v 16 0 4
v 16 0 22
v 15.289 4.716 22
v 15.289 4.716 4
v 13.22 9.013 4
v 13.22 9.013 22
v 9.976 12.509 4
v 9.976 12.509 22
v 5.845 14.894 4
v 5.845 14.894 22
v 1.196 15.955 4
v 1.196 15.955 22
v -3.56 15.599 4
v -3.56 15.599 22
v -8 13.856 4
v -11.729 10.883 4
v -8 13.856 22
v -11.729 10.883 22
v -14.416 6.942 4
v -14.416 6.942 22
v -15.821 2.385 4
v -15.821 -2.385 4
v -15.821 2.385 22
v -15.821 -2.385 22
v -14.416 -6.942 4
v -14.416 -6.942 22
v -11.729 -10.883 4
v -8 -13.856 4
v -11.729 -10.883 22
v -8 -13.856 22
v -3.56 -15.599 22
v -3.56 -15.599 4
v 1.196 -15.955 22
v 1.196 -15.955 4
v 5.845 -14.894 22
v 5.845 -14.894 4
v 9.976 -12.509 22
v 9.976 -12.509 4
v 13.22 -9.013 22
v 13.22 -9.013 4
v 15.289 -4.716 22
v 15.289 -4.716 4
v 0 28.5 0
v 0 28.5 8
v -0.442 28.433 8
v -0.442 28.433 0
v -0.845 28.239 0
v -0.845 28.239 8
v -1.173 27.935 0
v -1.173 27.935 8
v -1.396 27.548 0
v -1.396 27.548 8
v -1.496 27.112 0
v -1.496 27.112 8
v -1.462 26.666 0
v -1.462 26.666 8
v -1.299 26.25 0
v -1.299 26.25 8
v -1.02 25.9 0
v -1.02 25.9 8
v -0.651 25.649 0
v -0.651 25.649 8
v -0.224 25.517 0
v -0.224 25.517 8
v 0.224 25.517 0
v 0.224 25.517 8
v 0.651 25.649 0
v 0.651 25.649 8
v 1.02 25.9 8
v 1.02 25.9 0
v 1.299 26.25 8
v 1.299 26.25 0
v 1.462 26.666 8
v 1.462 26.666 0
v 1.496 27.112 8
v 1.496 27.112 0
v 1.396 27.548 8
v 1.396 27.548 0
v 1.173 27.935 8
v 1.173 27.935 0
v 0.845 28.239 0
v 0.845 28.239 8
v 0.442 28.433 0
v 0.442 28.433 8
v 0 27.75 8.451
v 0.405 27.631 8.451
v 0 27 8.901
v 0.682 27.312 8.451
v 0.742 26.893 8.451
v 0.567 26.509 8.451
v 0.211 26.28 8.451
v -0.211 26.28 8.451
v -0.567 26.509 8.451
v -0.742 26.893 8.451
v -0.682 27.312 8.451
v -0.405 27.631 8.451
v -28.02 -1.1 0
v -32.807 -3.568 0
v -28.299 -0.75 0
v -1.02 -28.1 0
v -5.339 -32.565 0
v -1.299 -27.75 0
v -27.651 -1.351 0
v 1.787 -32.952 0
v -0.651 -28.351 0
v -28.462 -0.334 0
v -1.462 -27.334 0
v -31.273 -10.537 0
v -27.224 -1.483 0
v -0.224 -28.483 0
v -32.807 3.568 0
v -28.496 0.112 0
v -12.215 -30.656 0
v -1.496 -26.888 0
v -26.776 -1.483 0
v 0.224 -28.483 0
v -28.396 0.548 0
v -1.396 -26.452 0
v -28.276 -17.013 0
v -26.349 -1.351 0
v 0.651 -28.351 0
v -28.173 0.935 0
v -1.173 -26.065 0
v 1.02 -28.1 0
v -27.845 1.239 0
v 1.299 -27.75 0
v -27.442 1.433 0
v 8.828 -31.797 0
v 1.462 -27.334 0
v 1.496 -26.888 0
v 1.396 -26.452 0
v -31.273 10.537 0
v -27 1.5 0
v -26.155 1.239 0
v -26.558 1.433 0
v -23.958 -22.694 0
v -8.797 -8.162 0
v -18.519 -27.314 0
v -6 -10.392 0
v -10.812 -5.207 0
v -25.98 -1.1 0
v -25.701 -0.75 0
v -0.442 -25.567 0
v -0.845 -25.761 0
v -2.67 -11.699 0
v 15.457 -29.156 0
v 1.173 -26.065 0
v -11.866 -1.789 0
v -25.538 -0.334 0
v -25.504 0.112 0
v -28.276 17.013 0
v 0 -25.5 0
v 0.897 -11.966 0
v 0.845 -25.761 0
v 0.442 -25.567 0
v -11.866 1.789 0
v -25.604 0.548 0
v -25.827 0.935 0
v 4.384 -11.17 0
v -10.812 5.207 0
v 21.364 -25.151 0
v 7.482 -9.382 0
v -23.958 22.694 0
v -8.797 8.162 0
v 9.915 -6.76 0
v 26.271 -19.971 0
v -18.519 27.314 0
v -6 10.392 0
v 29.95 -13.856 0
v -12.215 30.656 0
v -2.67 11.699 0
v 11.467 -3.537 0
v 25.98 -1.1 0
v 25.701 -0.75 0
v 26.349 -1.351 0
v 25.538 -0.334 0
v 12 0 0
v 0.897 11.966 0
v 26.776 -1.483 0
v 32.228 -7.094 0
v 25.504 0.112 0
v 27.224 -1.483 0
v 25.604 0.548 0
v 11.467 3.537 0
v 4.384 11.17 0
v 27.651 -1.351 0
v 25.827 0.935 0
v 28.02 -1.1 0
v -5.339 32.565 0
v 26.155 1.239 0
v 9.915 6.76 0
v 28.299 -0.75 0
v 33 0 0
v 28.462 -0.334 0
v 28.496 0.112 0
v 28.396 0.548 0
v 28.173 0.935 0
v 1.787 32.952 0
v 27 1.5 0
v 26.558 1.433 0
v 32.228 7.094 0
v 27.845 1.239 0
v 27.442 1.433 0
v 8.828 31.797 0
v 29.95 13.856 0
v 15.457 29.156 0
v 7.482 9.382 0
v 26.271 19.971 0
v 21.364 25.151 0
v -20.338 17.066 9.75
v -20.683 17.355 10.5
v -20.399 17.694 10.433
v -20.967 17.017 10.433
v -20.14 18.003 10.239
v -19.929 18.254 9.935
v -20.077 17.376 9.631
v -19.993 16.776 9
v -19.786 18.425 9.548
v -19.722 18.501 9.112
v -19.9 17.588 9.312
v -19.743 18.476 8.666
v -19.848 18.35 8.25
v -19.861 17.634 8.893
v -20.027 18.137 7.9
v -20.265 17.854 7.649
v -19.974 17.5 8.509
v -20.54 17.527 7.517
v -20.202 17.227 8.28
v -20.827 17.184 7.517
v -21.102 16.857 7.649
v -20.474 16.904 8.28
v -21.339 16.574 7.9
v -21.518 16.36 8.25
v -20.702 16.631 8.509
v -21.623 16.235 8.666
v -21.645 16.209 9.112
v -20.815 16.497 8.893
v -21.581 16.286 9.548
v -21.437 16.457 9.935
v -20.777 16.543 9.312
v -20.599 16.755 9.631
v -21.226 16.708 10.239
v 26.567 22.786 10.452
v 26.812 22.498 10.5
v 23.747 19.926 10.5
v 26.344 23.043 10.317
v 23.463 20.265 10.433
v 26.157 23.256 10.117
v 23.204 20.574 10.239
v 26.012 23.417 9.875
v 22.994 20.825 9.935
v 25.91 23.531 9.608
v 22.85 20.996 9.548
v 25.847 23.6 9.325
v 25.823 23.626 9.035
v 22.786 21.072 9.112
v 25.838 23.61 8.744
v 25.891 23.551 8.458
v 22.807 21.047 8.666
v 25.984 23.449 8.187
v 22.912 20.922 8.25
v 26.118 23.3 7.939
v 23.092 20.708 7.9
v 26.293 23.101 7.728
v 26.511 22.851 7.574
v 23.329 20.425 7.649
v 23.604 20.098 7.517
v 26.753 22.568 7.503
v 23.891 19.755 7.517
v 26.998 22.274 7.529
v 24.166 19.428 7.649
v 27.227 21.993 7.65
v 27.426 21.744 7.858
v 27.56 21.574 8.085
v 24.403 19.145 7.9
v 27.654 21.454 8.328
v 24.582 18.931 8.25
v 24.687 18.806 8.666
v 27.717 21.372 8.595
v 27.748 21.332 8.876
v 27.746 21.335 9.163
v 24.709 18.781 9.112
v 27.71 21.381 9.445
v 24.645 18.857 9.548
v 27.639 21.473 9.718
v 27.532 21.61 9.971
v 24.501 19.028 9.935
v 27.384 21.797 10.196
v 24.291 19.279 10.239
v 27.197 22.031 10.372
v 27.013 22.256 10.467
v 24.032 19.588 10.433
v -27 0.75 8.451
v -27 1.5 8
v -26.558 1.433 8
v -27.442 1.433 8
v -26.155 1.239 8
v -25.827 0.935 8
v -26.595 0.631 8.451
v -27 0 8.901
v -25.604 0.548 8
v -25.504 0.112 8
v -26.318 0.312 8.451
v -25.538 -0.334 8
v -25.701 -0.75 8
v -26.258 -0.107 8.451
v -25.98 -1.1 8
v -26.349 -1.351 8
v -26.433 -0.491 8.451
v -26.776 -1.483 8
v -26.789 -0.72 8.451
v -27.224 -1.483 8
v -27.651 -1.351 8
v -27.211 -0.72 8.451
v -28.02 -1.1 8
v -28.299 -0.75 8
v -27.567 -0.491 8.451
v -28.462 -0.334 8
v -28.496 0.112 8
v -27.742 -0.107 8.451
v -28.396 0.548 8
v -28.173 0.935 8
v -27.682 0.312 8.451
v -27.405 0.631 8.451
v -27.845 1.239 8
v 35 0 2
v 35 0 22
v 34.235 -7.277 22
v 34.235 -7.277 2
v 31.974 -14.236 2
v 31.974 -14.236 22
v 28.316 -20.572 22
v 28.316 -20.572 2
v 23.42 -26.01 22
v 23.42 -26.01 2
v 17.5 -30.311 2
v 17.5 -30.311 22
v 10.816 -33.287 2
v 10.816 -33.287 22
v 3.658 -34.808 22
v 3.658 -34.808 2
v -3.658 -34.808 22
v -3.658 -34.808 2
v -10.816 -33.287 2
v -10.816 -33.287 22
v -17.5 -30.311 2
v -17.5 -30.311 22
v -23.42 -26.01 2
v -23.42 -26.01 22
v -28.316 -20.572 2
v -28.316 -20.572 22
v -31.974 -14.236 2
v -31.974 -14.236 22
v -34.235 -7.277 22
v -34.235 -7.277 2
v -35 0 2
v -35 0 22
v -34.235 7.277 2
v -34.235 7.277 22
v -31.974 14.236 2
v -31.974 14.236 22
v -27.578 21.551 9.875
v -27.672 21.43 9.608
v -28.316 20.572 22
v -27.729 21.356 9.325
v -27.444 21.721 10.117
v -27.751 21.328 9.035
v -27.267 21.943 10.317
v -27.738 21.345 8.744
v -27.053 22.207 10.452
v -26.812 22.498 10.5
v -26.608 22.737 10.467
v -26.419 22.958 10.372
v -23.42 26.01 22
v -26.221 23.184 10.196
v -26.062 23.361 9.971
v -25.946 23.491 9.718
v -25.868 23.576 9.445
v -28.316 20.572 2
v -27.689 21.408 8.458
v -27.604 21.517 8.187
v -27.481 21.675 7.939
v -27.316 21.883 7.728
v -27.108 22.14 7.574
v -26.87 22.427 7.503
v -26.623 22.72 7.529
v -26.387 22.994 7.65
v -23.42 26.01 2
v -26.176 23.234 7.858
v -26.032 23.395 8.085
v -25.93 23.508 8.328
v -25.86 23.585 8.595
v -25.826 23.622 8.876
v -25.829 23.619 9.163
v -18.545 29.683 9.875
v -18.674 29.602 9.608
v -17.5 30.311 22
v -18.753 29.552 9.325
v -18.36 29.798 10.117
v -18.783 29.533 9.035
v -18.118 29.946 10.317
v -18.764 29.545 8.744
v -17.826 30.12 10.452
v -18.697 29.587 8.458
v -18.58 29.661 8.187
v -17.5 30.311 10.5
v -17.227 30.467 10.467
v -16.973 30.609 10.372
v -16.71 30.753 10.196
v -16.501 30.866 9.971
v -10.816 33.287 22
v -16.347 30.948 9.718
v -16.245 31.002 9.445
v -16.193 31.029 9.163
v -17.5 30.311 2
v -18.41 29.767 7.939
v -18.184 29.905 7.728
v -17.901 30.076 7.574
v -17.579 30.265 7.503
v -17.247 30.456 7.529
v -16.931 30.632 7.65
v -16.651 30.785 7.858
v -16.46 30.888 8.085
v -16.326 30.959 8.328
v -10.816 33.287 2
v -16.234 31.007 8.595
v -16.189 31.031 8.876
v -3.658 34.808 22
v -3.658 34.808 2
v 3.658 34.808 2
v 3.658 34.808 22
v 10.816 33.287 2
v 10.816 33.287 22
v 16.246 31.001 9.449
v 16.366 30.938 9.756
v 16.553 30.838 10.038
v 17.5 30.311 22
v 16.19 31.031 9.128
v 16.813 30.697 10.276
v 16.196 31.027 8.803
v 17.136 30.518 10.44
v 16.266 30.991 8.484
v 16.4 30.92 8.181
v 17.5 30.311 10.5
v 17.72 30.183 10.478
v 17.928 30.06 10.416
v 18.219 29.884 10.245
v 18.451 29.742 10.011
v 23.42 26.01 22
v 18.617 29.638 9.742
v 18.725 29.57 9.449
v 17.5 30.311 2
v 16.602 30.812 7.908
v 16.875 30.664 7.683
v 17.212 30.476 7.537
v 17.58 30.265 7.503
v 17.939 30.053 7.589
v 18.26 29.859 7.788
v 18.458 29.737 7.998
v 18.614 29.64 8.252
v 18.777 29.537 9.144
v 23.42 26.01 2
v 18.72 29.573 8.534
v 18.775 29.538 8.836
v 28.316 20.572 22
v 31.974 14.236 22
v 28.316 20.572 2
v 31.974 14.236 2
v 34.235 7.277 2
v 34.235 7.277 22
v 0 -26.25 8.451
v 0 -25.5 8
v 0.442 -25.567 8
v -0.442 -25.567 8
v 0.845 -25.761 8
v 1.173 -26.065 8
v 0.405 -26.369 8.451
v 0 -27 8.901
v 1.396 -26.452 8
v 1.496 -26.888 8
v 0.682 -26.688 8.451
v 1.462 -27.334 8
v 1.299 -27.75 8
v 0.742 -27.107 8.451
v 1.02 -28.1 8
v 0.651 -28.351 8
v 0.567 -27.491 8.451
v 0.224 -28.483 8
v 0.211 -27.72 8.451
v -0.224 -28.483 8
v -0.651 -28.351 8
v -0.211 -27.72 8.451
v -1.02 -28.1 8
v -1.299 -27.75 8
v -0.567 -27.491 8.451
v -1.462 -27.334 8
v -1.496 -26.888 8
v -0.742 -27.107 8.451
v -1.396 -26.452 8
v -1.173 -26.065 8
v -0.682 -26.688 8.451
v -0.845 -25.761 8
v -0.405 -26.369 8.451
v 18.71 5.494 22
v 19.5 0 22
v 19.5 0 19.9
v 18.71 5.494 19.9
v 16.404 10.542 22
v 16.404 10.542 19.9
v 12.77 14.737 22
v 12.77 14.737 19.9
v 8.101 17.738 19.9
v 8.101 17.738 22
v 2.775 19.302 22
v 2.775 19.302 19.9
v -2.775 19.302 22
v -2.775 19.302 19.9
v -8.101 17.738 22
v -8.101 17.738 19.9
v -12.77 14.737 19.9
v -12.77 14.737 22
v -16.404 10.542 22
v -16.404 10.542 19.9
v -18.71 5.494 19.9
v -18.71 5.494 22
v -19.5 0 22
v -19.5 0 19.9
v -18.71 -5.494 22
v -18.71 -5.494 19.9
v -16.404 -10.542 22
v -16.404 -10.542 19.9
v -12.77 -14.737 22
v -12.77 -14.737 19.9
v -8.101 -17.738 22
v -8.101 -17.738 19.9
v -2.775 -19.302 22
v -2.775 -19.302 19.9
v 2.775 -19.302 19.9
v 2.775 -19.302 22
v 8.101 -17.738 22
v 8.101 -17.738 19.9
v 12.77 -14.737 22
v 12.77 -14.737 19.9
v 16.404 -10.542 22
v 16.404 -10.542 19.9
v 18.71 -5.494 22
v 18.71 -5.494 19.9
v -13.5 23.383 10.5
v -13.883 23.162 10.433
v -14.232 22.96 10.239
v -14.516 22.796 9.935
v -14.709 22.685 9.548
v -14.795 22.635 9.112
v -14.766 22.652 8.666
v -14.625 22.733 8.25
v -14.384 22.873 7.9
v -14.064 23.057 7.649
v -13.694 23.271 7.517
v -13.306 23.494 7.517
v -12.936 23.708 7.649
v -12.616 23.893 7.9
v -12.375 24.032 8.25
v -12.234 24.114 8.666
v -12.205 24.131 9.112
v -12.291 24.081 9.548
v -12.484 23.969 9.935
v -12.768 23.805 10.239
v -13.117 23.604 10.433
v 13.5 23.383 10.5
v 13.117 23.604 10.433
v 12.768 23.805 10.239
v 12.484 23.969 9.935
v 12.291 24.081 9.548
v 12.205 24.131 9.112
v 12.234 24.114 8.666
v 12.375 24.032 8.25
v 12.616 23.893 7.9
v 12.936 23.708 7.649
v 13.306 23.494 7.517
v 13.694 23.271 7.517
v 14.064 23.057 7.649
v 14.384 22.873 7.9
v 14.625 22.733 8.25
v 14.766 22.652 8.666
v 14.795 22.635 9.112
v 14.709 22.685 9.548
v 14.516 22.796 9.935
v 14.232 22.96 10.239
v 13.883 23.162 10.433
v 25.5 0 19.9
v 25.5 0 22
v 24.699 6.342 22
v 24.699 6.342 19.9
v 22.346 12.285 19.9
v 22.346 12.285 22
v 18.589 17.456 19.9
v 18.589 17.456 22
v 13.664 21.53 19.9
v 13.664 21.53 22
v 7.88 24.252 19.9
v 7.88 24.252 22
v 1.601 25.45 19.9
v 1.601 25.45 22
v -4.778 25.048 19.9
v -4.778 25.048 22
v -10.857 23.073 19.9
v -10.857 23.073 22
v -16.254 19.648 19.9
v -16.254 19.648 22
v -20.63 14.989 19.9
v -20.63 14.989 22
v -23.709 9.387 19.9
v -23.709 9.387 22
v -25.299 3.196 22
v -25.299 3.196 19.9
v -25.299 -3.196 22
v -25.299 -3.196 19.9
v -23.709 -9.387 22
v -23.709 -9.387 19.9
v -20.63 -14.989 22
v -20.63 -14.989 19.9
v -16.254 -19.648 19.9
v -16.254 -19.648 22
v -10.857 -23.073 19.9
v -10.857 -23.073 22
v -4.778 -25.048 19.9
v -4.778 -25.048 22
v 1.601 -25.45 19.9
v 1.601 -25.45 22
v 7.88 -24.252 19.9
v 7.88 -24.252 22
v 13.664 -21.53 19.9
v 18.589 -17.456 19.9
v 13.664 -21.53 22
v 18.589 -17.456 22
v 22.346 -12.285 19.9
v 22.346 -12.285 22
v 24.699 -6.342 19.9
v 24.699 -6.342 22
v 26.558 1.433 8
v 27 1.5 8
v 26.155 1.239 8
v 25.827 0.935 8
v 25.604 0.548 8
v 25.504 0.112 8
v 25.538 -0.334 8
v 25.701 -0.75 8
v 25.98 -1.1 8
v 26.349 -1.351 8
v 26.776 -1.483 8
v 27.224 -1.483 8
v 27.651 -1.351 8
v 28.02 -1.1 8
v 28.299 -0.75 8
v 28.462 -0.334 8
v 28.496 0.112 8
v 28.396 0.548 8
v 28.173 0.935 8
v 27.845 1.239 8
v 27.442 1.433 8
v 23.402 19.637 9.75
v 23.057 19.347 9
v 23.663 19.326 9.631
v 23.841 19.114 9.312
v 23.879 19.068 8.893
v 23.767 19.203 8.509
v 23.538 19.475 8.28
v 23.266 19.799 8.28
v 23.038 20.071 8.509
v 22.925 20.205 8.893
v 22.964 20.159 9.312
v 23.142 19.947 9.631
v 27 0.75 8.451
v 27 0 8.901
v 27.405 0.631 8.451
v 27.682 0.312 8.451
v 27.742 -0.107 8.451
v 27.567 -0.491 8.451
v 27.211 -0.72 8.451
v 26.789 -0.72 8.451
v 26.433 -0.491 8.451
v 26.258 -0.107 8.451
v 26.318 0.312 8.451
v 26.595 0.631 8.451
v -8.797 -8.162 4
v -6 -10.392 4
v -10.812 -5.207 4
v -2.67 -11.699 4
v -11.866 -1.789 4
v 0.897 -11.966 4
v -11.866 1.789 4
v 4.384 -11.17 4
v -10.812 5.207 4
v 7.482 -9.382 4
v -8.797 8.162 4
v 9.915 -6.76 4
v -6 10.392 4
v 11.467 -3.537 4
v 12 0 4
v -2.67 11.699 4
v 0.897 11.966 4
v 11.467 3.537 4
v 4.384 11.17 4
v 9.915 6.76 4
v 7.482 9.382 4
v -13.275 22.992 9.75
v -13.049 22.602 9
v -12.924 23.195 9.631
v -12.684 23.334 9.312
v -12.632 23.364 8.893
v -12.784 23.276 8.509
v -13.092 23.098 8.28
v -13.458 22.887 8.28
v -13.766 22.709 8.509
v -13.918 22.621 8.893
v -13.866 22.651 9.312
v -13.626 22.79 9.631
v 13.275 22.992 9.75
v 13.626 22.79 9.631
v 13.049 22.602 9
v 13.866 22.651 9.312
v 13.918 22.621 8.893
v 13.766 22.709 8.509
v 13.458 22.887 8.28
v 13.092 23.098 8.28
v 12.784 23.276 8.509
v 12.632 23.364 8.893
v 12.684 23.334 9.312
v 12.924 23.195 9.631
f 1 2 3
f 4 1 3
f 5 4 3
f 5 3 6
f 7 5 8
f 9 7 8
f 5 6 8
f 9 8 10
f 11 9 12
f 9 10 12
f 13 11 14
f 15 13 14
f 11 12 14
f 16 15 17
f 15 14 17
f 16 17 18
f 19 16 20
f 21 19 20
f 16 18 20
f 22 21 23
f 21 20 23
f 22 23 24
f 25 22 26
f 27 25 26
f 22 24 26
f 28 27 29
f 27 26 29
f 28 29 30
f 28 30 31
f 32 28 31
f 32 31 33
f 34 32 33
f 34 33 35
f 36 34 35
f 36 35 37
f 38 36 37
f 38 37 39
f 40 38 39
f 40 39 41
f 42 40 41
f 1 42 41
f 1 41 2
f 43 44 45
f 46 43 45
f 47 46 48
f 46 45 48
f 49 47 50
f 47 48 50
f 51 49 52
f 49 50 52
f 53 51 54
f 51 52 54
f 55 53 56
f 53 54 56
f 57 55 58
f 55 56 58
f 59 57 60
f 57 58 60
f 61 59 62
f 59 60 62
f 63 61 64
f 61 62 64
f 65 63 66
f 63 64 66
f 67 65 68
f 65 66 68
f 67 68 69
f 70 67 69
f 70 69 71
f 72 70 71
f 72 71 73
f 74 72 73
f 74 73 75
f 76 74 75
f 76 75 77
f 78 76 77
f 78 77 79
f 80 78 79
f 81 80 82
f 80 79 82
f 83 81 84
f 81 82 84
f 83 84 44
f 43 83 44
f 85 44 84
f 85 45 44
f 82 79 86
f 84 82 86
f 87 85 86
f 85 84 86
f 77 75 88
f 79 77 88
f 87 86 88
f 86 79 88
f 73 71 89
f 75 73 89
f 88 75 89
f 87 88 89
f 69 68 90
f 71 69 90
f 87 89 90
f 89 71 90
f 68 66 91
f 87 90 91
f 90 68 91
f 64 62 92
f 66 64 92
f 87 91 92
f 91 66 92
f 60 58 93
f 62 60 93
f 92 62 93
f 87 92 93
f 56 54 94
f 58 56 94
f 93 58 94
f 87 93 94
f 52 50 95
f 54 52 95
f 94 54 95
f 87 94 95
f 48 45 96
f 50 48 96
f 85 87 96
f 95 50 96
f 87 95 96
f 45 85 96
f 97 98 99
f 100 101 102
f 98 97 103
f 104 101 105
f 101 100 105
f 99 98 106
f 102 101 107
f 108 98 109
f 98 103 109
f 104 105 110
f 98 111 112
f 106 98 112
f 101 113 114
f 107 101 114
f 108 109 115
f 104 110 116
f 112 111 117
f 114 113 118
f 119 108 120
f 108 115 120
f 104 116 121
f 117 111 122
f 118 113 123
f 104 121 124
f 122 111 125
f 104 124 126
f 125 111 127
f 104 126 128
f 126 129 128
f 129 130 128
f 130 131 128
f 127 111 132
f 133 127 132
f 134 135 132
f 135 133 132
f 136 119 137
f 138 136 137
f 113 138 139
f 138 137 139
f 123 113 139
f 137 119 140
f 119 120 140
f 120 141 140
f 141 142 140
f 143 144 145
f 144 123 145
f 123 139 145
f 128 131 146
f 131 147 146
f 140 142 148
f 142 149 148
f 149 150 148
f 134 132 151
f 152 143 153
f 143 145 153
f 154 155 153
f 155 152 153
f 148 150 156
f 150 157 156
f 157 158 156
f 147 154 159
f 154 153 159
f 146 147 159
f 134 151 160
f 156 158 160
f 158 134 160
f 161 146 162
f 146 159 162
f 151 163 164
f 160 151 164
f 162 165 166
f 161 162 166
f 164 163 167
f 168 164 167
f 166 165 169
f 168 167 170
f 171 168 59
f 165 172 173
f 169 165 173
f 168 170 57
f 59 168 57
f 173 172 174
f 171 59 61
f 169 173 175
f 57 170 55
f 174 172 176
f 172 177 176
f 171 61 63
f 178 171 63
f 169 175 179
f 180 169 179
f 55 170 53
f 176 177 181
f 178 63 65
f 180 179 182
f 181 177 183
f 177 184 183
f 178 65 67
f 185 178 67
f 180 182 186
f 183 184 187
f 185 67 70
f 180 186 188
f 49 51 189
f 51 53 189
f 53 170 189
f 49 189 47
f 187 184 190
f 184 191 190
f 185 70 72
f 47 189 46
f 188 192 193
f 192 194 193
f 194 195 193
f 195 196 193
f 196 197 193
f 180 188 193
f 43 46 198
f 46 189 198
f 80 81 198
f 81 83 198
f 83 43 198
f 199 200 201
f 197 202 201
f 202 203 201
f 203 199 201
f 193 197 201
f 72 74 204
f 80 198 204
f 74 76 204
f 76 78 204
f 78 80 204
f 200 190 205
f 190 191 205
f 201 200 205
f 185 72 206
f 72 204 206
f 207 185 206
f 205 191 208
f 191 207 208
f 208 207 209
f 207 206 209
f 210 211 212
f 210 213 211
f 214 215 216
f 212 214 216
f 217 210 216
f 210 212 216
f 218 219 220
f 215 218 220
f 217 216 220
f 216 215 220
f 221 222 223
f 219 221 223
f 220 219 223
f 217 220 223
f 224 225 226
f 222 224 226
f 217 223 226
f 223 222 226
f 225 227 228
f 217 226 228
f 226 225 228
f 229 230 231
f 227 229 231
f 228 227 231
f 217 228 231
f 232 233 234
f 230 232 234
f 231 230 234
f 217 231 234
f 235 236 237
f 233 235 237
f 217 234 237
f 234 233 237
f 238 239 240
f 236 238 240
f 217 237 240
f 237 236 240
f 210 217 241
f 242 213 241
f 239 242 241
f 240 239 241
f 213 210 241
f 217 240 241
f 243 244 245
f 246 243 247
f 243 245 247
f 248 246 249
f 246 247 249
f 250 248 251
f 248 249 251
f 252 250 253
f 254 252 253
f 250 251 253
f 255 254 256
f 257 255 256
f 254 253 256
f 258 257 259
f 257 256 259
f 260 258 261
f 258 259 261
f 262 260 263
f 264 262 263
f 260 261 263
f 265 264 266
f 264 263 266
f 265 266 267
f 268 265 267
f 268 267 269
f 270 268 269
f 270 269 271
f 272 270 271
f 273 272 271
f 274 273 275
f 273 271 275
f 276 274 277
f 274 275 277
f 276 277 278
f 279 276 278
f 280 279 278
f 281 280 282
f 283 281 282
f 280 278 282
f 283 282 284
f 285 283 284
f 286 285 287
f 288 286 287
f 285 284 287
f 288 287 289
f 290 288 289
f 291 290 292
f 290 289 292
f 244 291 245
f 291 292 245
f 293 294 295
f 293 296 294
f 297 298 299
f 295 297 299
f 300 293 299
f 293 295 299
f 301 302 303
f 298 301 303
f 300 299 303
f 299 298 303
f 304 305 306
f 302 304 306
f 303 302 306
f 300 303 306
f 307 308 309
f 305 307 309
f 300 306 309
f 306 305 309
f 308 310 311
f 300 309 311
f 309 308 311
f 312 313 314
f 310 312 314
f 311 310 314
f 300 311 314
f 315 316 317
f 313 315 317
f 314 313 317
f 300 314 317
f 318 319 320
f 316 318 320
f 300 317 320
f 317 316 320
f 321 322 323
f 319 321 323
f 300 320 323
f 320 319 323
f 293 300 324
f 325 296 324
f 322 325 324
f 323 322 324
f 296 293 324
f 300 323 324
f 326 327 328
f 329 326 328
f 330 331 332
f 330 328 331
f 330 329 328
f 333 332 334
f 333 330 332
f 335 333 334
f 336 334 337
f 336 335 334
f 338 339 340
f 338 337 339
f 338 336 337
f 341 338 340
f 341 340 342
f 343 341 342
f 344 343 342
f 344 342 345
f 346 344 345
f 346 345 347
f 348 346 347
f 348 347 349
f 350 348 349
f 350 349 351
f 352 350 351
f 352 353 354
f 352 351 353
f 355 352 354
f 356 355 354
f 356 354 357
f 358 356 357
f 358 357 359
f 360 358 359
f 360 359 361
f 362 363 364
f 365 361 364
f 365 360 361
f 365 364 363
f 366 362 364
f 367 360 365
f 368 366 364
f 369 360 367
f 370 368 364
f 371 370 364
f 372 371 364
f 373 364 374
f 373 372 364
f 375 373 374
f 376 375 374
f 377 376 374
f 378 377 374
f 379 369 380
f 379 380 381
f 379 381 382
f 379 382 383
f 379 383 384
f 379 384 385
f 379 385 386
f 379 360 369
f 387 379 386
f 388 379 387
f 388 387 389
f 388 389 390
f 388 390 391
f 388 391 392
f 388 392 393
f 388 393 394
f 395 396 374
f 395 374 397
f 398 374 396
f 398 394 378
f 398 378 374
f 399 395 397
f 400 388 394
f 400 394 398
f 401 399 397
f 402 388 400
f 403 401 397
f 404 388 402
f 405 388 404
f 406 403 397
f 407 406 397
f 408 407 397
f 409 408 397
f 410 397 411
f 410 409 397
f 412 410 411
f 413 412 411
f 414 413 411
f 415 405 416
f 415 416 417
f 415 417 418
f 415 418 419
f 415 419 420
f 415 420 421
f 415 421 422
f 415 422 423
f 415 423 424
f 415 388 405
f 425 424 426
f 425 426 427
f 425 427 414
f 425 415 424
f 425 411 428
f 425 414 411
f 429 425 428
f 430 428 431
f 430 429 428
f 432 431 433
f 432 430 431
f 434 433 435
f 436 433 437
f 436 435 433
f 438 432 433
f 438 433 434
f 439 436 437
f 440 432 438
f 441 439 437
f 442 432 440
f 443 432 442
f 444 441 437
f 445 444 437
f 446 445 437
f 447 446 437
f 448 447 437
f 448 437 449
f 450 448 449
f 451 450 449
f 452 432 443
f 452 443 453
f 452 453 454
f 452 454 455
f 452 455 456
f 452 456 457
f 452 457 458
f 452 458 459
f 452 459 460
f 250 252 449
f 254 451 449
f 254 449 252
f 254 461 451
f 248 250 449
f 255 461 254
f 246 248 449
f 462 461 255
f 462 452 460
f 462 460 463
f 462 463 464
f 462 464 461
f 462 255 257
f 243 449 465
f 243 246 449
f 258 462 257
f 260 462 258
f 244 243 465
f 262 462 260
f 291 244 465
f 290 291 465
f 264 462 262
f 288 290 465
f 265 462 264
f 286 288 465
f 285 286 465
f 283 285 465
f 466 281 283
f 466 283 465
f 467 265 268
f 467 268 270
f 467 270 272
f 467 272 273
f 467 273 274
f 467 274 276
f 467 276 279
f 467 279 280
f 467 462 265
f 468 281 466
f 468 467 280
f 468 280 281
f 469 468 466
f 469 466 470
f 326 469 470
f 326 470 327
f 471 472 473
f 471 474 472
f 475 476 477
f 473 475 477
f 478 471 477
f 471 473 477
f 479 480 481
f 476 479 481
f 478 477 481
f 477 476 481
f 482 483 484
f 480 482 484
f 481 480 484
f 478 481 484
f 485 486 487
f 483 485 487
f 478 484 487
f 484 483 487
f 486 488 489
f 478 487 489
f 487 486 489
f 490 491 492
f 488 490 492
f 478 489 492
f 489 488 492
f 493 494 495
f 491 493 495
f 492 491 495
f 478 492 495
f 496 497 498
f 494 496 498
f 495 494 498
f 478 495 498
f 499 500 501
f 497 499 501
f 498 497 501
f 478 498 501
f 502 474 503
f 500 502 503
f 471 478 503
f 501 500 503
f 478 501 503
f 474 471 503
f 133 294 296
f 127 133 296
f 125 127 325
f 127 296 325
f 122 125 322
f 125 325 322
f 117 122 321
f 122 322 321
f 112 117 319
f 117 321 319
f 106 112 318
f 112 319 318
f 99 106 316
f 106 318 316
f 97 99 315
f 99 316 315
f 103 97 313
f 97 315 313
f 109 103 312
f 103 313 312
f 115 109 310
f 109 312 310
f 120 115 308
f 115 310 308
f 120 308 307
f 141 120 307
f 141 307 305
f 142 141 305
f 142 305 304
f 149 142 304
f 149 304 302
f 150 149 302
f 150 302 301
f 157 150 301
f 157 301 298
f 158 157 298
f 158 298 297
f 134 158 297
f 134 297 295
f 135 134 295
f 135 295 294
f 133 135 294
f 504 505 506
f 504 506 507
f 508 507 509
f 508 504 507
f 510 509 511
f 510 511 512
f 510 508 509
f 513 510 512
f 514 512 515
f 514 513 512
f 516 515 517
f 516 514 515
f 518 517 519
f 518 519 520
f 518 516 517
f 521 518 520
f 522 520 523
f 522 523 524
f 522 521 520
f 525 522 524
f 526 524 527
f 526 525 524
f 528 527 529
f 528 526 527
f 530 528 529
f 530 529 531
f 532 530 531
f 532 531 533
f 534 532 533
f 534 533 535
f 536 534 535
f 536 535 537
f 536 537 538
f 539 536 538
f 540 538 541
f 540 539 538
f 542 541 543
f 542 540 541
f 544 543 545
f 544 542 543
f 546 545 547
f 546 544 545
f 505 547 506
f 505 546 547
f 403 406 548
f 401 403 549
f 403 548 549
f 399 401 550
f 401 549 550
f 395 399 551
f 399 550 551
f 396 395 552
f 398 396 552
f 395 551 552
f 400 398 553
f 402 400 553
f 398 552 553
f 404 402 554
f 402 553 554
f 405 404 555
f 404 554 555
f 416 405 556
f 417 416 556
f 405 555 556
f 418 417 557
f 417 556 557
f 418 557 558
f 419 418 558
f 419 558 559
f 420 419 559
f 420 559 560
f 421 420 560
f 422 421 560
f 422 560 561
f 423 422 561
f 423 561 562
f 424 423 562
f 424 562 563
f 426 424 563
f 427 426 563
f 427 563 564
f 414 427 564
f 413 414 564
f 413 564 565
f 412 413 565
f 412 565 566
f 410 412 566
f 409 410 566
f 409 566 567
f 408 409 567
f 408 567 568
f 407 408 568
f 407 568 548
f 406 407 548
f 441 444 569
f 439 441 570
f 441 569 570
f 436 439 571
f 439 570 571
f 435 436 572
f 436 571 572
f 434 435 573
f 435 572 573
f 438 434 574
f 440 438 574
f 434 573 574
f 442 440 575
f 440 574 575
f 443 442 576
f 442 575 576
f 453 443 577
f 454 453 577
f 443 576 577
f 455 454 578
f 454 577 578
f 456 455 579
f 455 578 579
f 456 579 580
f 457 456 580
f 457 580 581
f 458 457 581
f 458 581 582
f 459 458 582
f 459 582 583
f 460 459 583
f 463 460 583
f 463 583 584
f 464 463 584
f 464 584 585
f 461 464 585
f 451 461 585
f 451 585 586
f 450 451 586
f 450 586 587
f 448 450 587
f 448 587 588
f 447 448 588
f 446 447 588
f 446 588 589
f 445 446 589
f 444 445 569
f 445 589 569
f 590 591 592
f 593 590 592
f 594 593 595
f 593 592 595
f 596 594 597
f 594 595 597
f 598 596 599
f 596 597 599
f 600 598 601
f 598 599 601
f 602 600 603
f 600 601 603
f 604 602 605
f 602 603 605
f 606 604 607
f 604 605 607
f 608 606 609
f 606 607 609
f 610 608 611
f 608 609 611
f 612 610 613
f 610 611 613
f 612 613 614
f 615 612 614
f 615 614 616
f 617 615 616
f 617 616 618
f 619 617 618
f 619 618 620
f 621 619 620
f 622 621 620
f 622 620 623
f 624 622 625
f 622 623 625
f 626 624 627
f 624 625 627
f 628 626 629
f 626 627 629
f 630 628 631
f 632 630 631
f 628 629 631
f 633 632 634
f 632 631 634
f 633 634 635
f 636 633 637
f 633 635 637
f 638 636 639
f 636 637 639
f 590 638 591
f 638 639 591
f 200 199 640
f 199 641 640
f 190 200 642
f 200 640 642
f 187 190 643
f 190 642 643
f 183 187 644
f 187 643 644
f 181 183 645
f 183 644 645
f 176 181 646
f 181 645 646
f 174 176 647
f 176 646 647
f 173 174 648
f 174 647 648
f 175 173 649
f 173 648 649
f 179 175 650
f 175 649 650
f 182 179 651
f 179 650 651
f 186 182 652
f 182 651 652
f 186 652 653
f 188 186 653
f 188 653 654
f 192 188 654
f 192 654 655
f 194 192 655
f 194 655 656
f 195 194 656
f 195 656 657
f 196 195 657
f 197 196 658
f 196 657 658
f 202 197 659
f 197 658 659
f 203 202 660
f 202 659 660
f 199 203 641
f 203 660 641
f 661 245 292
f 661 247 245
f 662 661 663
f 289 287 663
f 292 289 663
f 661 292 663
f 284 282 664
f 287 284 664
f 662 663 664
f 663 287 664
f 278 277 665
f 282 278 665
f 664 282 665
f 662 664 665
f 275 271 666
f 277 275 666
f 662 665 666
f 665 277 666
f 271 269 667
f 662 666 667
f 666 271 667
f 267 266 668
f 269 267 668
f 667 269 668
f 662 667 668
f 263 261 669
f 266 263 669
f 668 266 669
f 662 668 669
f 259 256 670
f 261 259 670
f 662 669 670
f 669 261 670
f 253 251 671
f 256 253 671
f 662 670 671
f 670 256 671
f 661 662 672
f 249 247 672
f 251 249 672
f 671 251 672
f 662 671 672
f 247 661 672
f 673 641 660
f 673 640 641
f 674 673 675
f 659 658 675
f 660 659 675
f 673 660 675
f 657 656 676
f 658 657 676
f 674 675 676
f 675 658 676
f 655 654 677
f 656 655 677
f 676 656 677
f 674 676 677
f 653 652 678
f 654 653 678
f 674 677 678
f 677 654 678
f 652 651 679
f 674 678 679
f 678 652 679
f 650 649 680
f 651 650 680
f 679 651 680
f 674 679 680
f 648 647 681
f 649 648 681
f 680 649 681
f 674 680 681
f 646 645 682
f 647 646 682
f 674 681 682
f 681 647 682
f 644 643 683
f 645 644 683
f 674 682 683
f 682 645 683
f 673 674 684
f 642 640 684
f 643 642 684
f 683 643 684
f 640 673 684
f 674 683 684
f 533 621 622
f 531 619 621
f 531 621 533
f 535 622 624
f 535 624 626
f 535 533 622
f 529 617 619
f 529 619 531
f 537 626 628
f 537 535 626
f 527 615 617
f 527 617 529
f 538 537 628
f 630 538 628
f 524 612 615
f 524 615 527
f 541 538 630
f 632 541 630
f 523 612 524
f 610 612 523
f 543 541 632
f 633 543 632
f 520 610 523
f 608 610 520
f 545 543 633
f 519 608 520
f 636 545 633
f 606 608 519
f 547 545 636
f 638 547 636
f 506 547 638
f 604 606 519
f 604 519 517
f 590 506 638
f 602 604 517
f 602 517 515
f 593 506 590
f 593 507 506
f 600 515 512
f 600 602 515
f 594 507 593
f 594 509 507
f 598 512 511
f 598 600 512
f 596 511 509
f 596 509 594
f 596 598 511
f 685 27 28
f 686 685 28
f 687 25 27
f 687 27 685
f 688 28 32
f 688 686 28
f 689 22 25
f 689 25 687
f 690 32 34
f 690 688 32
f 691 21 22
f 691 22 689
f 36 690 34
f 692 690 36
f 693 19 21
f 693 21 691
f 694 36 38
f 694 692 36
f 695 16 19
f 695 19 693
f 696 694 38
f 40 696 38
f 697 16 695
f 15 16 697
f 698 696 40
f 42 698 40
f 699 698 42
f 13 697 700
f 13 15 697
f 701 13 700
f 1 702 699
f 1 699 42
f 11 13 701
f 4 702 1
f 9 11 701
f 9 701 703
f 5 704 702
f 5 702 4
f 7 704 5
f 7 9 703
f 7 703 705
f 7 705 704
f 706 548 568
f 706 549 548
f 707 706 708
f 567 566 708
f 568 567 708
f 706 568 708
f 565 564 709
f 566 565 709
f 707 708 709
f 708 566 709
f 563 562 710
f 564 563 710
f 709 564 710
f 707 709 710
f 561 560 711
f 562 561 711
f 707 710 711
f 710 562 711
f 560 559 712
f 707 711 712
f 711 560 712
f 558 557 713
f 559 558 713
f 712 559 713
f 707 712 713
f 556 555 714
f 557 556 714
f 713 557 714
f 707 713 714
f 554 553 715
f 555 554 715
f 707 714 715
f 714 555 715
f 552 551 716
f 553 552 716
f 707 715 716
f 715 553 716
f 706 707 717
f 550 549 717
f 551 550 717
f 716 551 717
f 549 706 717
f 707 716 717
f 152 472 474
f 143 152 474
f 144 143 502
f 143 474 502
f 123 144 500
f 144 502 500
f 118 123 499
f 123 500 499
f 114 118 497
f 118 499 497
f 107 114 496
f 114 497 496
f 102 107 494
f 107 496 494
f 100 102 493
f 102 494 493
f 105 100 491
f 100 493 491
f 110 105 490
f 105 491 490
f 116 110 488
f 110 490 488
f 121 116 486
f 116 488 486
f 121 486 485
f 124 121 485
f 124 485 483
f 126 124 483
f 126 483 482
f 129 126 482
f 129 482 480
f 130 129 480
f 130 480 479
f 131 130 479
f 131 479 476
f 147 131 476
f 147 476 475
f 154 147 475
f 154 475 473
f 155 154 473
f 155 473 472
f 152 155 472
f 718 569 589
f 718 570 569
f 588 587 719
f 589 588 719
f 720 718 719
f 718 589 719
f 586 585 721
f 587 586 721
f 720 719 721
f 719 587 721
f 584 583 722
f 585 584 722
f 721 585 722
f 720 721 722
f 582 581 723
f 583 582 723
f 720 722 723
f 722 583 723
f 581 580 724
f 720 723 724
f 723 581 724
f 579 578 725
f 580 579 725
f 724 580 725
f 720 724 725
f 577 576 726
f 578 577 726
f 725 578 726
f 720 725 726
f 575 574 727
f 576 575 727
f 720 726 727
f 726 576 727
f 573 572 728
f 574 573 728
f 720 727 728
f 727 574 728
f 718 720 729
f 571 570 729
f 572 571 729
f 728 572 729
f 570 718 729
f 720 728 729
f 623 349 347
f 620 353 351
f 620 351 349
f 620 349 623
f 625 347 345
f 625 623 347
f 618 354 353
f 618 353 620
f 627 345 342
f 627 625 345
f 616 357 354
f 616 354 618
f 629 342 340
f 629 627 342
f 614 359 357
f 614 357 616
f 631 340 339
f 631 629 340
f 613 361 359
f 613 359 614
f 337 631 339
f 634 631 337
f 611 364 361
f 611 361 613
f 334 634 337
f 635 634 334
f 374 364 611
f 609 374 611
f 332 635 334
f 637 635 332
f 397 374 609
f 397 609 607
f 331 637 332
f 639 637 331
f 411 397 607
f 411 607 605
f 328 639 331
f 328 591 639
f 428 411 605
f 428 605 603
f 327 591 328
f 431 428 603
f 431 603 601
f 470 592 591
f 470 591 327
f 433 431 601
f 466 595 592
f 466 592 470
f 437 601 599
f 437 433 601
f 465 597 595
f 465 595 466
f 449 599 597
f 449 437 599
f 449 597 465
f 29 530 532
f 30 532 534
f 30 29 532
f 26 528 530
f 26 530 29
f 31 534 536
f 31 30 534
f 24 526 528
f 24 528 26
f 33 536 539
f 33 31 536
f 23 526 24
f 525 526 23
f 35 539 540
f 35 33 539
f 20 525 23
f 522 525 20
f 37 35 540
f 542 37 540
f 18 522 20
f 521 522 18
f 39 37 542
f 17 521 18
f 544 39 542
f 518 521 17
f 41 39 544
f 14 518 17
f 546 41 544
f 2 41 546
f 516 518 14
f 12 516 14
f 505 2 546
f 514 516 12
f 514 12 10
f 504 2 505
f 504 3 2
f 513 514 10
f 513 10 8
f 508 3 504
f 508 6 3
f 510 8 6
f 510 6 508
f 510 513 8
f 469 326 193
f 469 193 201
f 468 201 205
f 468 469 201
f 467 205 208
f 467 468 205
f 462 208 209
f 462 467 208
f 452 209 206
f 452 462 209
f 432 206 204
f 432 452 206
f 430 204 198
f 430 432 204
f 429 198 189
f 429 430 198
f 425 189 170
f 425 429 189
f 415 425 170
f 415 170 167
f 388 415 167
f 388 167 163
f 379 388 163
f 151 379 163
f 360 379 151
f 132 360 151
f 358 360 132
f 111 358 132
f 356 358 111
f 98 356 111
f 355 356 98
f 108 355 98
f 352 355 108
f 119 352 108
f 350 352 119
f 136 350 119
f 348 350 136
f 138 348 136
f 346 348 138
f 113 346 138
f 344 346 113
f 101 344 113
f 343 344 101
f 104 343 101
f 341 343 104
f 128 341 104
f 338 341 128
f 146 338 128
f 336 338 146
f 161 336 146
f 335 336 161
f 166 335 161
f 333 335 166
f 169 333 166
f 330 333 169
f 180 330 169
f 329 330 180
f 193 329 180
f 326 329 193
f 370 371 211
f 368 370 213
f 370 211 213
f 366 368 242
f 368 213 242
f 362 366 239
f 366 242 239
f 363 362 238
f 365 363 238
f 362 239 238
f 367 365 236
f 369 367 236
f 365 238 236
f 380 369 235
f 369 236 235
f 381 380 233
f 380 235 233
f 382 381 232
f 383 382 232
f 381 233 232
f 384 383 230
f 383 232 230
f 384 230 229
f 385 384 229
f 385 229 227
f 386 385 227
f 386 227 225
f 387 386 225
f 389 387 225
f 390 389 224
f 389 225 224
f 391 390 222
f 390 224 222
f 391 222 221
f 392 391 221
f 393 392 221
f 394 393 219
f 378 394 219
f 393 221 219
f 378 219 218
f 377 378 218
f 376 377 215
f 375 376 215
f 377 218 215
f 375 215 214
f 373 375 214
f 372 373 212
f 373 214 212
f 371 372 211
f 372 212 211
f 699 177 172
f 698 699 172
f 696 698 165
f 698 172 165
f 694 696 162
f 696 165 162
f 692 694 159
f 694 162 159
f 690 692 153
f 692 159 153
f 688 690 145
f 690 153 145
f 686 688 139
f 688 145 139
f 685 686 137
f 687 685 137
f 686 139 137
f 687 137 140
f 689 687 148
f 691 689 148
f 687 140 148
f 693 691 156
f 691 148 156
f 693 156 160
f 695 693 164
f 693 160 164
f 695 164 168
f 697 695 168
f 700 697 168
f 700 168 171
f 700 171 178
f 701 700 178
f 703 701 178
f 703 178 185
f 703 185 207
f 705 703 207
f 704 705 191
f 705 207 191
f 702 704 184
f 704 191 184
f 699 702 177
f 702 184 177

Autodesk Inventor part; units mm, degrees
sketch "Sketch1" plane through (0, 0, 0) normal (0, 0, 1) x (1, 0, 0)
  circle A0 centre (0, 0) radius 35
  circle A1 centre (0, 0) radius 12
  dimension "d0" = 70
  dimension "d1" = 24
extrude "Extrusion1" add sketch "Sketch1" along normal blind 22
sketch "Sketch2" plane through (0, 0, 22) normal (0, 0, 1) x (1, 0, 0)
  circle A0 centre (0, 0) radius 12 projected
  circle A1 centre (0, 0) radius 35 projected
  circle A2 centre (0, 0) radius 25.5
  circle A3 centre (0, 0) radius 19.5
  dimension "d4" = 51
  dimension "d5" = 6
extrude "Extrusion2" cut sketch "Sketch2" against normal blind 2.1 contours A2
sketch "Sketch3" plane through (0, 0, 22) normal (0, 0, 1) x (1, 0, 0)
  line L0 (0, 0) -> (0, 45.779) construction
  line L1 (0, 0) -> (38.81, 0) construction
  line L2 (0, 0) -> (26.8116, 22.4976) construction
  circle A0 centre (0, 0) radius 35 construction
  line L3 (0, 0) -> (35, 0) construction
  line L4 (0, 0) -> (17.5, 30.3109) construction
  line L5 (0, 0) -> (35, 0) construction
  line L6 (0, 0) -> (-26.8116, 22.4976) construction
  line L7 (0, 0) -> (-17.5, 30.3109) construction
  dimension "d11" = 40
  dimension "d12" = 60
ref_plane "Work Plane1" through (17.5, 30.3109, 22) normal (0.5, 0.866, 0) x (-0.866, 0.5, 0)
ref_plane "Work Plane2" through (26.8116, 22.4976, 22) normal (0.766, 0.6428, 0) x (-0.6428, 0.766, 0)
ref_plane "Work Plane3" through (-17.5, 30.3109, 22) normal (-0.5, 0.866, 0) x (-0.866, -0.5, 0)
ref_plane "Work Plane4" through (-26.8116, 22.4976, 22) normal (-0.766, 0.6428, 0) x (-0.6428, -0.766, 0)
sketch "Sketch4" plane through (26.8116, 22.4976, 22) normal (0.766, 0.6428, 0) x (-0.6428, 0.766, 0)
  line L0 (35, 0) -> (-35, 0) projected
  point P0 (0, -22)
  point P1 (0, -13)
  dimension "d13" = 13
hole "Hole1" at (26.8116, 22.4976, 9) direction (-0.766, -0.6428, 0) diameter 3 depth 4 tip angle 118
sketch "Sketch5" plane through (17.5, 30.3109, 22) normal (0.5, 0.866, 0) x (-0.866, 0.5, 0)
  line L0 (35, 0) -> (-35, 0) projected
  point P0 (0, -22)
  point P1 (0, -13)
  dimension "d21" = 13
hole "Hole2" at (17.5, 30.3109, 9) direction (-0.5, -0.866, 0) diameter 3 depth 8 tip angle 118
sketch "Sketch6" plane through (-17.5, 30.3109, 22) normal (-0.5, 0.866, 0) x (-0.866, -0.5, 0)
  line L0 (35, 0) -> (-35, 0) projected
  point P0 (0, -22)
  point P1 (0, -13)
  dimension "d29" = 13
hole "Hole3" at (-17.5, 30.3109, 9) direction (0.5, -0.866, 0) diameter 3 depth 8 tip angle 118
sketch "Sketch7" plane through (-26.8116, 22.4976, 22) normal (-0.766, 0.6428, 0) x (-0.6428, -0.766, 0)
  line L0 (35, 0) -> (-35, 0) projected
  point P0 (0, -22)
  point P1 (0, -13)
  dimension "d37" = 13
hole "Hole4" at (-26.8116, 22.4976, 9) direction (0.766, -0.6428, 0) diameter 3 depth 8 tip angle 118
thread "Thread1" size "M3x0.5" class "6H" standard "ANSI Metric M Profile" full length
thread "Thread2" size "M3x0.5" class "6H" standard "ANSI Metric M Profile" full length
thread "Thread3" size "M3x0.5" class "6H" standard "ANSI Metric M Profile" full length
thread "Thread4" size "M3x0.5" class "6H" standard "ANSI Metric M Profile" full length
sketch "Sketch9" plane through (0, 0, 22) normal (0, 0, 1) x (1, 0, 0)
  circle A0 centre (0, 0) radius 16
  dimension "d53" = 32
extrude "Extrusion3" cut sketch "Sketch9" against normal blind 18
sketch "Sketch11" plane through (0, 0, 0) normal (0, 0, -1) x (-1, 0, 0)
  circle A0 centre (0, 0) radius 27 construction
  point P0 (-27, 0)
  point P1 (0, -27)
  point P2 (27, 0)
  point P3 (0, 27)
  dimension "d77" = 54
  dimension "d80" = 360
hole "Hole6" at (27, 0, 0) at (0, -27, 0) at (-27, 0, 0) at (0, 27, 0) direction (0, 0, 1) diameter 3 depth 8 tip angle 118
thread "Thread9" size "M3x0.5" class "6H" standard "ANSI Metric M Profile" full length
thread "Thread10" size "M3x0.5" class "6H" standard "ANSI Metric M Profile" full length
thread "Thread11" size "M3x0.5" class "6H" standard "ANSI Metric M Profile" full length
thread "Thread12" size "M3x0.5" class "6H" standard "ANSI Metric M Profile" full length
chamfer "Chamfer2" distance 2 angle 45 1 edges at (-35, 0, 0)
properties part number "joint_mag_side" material "Aluminum 6061"
